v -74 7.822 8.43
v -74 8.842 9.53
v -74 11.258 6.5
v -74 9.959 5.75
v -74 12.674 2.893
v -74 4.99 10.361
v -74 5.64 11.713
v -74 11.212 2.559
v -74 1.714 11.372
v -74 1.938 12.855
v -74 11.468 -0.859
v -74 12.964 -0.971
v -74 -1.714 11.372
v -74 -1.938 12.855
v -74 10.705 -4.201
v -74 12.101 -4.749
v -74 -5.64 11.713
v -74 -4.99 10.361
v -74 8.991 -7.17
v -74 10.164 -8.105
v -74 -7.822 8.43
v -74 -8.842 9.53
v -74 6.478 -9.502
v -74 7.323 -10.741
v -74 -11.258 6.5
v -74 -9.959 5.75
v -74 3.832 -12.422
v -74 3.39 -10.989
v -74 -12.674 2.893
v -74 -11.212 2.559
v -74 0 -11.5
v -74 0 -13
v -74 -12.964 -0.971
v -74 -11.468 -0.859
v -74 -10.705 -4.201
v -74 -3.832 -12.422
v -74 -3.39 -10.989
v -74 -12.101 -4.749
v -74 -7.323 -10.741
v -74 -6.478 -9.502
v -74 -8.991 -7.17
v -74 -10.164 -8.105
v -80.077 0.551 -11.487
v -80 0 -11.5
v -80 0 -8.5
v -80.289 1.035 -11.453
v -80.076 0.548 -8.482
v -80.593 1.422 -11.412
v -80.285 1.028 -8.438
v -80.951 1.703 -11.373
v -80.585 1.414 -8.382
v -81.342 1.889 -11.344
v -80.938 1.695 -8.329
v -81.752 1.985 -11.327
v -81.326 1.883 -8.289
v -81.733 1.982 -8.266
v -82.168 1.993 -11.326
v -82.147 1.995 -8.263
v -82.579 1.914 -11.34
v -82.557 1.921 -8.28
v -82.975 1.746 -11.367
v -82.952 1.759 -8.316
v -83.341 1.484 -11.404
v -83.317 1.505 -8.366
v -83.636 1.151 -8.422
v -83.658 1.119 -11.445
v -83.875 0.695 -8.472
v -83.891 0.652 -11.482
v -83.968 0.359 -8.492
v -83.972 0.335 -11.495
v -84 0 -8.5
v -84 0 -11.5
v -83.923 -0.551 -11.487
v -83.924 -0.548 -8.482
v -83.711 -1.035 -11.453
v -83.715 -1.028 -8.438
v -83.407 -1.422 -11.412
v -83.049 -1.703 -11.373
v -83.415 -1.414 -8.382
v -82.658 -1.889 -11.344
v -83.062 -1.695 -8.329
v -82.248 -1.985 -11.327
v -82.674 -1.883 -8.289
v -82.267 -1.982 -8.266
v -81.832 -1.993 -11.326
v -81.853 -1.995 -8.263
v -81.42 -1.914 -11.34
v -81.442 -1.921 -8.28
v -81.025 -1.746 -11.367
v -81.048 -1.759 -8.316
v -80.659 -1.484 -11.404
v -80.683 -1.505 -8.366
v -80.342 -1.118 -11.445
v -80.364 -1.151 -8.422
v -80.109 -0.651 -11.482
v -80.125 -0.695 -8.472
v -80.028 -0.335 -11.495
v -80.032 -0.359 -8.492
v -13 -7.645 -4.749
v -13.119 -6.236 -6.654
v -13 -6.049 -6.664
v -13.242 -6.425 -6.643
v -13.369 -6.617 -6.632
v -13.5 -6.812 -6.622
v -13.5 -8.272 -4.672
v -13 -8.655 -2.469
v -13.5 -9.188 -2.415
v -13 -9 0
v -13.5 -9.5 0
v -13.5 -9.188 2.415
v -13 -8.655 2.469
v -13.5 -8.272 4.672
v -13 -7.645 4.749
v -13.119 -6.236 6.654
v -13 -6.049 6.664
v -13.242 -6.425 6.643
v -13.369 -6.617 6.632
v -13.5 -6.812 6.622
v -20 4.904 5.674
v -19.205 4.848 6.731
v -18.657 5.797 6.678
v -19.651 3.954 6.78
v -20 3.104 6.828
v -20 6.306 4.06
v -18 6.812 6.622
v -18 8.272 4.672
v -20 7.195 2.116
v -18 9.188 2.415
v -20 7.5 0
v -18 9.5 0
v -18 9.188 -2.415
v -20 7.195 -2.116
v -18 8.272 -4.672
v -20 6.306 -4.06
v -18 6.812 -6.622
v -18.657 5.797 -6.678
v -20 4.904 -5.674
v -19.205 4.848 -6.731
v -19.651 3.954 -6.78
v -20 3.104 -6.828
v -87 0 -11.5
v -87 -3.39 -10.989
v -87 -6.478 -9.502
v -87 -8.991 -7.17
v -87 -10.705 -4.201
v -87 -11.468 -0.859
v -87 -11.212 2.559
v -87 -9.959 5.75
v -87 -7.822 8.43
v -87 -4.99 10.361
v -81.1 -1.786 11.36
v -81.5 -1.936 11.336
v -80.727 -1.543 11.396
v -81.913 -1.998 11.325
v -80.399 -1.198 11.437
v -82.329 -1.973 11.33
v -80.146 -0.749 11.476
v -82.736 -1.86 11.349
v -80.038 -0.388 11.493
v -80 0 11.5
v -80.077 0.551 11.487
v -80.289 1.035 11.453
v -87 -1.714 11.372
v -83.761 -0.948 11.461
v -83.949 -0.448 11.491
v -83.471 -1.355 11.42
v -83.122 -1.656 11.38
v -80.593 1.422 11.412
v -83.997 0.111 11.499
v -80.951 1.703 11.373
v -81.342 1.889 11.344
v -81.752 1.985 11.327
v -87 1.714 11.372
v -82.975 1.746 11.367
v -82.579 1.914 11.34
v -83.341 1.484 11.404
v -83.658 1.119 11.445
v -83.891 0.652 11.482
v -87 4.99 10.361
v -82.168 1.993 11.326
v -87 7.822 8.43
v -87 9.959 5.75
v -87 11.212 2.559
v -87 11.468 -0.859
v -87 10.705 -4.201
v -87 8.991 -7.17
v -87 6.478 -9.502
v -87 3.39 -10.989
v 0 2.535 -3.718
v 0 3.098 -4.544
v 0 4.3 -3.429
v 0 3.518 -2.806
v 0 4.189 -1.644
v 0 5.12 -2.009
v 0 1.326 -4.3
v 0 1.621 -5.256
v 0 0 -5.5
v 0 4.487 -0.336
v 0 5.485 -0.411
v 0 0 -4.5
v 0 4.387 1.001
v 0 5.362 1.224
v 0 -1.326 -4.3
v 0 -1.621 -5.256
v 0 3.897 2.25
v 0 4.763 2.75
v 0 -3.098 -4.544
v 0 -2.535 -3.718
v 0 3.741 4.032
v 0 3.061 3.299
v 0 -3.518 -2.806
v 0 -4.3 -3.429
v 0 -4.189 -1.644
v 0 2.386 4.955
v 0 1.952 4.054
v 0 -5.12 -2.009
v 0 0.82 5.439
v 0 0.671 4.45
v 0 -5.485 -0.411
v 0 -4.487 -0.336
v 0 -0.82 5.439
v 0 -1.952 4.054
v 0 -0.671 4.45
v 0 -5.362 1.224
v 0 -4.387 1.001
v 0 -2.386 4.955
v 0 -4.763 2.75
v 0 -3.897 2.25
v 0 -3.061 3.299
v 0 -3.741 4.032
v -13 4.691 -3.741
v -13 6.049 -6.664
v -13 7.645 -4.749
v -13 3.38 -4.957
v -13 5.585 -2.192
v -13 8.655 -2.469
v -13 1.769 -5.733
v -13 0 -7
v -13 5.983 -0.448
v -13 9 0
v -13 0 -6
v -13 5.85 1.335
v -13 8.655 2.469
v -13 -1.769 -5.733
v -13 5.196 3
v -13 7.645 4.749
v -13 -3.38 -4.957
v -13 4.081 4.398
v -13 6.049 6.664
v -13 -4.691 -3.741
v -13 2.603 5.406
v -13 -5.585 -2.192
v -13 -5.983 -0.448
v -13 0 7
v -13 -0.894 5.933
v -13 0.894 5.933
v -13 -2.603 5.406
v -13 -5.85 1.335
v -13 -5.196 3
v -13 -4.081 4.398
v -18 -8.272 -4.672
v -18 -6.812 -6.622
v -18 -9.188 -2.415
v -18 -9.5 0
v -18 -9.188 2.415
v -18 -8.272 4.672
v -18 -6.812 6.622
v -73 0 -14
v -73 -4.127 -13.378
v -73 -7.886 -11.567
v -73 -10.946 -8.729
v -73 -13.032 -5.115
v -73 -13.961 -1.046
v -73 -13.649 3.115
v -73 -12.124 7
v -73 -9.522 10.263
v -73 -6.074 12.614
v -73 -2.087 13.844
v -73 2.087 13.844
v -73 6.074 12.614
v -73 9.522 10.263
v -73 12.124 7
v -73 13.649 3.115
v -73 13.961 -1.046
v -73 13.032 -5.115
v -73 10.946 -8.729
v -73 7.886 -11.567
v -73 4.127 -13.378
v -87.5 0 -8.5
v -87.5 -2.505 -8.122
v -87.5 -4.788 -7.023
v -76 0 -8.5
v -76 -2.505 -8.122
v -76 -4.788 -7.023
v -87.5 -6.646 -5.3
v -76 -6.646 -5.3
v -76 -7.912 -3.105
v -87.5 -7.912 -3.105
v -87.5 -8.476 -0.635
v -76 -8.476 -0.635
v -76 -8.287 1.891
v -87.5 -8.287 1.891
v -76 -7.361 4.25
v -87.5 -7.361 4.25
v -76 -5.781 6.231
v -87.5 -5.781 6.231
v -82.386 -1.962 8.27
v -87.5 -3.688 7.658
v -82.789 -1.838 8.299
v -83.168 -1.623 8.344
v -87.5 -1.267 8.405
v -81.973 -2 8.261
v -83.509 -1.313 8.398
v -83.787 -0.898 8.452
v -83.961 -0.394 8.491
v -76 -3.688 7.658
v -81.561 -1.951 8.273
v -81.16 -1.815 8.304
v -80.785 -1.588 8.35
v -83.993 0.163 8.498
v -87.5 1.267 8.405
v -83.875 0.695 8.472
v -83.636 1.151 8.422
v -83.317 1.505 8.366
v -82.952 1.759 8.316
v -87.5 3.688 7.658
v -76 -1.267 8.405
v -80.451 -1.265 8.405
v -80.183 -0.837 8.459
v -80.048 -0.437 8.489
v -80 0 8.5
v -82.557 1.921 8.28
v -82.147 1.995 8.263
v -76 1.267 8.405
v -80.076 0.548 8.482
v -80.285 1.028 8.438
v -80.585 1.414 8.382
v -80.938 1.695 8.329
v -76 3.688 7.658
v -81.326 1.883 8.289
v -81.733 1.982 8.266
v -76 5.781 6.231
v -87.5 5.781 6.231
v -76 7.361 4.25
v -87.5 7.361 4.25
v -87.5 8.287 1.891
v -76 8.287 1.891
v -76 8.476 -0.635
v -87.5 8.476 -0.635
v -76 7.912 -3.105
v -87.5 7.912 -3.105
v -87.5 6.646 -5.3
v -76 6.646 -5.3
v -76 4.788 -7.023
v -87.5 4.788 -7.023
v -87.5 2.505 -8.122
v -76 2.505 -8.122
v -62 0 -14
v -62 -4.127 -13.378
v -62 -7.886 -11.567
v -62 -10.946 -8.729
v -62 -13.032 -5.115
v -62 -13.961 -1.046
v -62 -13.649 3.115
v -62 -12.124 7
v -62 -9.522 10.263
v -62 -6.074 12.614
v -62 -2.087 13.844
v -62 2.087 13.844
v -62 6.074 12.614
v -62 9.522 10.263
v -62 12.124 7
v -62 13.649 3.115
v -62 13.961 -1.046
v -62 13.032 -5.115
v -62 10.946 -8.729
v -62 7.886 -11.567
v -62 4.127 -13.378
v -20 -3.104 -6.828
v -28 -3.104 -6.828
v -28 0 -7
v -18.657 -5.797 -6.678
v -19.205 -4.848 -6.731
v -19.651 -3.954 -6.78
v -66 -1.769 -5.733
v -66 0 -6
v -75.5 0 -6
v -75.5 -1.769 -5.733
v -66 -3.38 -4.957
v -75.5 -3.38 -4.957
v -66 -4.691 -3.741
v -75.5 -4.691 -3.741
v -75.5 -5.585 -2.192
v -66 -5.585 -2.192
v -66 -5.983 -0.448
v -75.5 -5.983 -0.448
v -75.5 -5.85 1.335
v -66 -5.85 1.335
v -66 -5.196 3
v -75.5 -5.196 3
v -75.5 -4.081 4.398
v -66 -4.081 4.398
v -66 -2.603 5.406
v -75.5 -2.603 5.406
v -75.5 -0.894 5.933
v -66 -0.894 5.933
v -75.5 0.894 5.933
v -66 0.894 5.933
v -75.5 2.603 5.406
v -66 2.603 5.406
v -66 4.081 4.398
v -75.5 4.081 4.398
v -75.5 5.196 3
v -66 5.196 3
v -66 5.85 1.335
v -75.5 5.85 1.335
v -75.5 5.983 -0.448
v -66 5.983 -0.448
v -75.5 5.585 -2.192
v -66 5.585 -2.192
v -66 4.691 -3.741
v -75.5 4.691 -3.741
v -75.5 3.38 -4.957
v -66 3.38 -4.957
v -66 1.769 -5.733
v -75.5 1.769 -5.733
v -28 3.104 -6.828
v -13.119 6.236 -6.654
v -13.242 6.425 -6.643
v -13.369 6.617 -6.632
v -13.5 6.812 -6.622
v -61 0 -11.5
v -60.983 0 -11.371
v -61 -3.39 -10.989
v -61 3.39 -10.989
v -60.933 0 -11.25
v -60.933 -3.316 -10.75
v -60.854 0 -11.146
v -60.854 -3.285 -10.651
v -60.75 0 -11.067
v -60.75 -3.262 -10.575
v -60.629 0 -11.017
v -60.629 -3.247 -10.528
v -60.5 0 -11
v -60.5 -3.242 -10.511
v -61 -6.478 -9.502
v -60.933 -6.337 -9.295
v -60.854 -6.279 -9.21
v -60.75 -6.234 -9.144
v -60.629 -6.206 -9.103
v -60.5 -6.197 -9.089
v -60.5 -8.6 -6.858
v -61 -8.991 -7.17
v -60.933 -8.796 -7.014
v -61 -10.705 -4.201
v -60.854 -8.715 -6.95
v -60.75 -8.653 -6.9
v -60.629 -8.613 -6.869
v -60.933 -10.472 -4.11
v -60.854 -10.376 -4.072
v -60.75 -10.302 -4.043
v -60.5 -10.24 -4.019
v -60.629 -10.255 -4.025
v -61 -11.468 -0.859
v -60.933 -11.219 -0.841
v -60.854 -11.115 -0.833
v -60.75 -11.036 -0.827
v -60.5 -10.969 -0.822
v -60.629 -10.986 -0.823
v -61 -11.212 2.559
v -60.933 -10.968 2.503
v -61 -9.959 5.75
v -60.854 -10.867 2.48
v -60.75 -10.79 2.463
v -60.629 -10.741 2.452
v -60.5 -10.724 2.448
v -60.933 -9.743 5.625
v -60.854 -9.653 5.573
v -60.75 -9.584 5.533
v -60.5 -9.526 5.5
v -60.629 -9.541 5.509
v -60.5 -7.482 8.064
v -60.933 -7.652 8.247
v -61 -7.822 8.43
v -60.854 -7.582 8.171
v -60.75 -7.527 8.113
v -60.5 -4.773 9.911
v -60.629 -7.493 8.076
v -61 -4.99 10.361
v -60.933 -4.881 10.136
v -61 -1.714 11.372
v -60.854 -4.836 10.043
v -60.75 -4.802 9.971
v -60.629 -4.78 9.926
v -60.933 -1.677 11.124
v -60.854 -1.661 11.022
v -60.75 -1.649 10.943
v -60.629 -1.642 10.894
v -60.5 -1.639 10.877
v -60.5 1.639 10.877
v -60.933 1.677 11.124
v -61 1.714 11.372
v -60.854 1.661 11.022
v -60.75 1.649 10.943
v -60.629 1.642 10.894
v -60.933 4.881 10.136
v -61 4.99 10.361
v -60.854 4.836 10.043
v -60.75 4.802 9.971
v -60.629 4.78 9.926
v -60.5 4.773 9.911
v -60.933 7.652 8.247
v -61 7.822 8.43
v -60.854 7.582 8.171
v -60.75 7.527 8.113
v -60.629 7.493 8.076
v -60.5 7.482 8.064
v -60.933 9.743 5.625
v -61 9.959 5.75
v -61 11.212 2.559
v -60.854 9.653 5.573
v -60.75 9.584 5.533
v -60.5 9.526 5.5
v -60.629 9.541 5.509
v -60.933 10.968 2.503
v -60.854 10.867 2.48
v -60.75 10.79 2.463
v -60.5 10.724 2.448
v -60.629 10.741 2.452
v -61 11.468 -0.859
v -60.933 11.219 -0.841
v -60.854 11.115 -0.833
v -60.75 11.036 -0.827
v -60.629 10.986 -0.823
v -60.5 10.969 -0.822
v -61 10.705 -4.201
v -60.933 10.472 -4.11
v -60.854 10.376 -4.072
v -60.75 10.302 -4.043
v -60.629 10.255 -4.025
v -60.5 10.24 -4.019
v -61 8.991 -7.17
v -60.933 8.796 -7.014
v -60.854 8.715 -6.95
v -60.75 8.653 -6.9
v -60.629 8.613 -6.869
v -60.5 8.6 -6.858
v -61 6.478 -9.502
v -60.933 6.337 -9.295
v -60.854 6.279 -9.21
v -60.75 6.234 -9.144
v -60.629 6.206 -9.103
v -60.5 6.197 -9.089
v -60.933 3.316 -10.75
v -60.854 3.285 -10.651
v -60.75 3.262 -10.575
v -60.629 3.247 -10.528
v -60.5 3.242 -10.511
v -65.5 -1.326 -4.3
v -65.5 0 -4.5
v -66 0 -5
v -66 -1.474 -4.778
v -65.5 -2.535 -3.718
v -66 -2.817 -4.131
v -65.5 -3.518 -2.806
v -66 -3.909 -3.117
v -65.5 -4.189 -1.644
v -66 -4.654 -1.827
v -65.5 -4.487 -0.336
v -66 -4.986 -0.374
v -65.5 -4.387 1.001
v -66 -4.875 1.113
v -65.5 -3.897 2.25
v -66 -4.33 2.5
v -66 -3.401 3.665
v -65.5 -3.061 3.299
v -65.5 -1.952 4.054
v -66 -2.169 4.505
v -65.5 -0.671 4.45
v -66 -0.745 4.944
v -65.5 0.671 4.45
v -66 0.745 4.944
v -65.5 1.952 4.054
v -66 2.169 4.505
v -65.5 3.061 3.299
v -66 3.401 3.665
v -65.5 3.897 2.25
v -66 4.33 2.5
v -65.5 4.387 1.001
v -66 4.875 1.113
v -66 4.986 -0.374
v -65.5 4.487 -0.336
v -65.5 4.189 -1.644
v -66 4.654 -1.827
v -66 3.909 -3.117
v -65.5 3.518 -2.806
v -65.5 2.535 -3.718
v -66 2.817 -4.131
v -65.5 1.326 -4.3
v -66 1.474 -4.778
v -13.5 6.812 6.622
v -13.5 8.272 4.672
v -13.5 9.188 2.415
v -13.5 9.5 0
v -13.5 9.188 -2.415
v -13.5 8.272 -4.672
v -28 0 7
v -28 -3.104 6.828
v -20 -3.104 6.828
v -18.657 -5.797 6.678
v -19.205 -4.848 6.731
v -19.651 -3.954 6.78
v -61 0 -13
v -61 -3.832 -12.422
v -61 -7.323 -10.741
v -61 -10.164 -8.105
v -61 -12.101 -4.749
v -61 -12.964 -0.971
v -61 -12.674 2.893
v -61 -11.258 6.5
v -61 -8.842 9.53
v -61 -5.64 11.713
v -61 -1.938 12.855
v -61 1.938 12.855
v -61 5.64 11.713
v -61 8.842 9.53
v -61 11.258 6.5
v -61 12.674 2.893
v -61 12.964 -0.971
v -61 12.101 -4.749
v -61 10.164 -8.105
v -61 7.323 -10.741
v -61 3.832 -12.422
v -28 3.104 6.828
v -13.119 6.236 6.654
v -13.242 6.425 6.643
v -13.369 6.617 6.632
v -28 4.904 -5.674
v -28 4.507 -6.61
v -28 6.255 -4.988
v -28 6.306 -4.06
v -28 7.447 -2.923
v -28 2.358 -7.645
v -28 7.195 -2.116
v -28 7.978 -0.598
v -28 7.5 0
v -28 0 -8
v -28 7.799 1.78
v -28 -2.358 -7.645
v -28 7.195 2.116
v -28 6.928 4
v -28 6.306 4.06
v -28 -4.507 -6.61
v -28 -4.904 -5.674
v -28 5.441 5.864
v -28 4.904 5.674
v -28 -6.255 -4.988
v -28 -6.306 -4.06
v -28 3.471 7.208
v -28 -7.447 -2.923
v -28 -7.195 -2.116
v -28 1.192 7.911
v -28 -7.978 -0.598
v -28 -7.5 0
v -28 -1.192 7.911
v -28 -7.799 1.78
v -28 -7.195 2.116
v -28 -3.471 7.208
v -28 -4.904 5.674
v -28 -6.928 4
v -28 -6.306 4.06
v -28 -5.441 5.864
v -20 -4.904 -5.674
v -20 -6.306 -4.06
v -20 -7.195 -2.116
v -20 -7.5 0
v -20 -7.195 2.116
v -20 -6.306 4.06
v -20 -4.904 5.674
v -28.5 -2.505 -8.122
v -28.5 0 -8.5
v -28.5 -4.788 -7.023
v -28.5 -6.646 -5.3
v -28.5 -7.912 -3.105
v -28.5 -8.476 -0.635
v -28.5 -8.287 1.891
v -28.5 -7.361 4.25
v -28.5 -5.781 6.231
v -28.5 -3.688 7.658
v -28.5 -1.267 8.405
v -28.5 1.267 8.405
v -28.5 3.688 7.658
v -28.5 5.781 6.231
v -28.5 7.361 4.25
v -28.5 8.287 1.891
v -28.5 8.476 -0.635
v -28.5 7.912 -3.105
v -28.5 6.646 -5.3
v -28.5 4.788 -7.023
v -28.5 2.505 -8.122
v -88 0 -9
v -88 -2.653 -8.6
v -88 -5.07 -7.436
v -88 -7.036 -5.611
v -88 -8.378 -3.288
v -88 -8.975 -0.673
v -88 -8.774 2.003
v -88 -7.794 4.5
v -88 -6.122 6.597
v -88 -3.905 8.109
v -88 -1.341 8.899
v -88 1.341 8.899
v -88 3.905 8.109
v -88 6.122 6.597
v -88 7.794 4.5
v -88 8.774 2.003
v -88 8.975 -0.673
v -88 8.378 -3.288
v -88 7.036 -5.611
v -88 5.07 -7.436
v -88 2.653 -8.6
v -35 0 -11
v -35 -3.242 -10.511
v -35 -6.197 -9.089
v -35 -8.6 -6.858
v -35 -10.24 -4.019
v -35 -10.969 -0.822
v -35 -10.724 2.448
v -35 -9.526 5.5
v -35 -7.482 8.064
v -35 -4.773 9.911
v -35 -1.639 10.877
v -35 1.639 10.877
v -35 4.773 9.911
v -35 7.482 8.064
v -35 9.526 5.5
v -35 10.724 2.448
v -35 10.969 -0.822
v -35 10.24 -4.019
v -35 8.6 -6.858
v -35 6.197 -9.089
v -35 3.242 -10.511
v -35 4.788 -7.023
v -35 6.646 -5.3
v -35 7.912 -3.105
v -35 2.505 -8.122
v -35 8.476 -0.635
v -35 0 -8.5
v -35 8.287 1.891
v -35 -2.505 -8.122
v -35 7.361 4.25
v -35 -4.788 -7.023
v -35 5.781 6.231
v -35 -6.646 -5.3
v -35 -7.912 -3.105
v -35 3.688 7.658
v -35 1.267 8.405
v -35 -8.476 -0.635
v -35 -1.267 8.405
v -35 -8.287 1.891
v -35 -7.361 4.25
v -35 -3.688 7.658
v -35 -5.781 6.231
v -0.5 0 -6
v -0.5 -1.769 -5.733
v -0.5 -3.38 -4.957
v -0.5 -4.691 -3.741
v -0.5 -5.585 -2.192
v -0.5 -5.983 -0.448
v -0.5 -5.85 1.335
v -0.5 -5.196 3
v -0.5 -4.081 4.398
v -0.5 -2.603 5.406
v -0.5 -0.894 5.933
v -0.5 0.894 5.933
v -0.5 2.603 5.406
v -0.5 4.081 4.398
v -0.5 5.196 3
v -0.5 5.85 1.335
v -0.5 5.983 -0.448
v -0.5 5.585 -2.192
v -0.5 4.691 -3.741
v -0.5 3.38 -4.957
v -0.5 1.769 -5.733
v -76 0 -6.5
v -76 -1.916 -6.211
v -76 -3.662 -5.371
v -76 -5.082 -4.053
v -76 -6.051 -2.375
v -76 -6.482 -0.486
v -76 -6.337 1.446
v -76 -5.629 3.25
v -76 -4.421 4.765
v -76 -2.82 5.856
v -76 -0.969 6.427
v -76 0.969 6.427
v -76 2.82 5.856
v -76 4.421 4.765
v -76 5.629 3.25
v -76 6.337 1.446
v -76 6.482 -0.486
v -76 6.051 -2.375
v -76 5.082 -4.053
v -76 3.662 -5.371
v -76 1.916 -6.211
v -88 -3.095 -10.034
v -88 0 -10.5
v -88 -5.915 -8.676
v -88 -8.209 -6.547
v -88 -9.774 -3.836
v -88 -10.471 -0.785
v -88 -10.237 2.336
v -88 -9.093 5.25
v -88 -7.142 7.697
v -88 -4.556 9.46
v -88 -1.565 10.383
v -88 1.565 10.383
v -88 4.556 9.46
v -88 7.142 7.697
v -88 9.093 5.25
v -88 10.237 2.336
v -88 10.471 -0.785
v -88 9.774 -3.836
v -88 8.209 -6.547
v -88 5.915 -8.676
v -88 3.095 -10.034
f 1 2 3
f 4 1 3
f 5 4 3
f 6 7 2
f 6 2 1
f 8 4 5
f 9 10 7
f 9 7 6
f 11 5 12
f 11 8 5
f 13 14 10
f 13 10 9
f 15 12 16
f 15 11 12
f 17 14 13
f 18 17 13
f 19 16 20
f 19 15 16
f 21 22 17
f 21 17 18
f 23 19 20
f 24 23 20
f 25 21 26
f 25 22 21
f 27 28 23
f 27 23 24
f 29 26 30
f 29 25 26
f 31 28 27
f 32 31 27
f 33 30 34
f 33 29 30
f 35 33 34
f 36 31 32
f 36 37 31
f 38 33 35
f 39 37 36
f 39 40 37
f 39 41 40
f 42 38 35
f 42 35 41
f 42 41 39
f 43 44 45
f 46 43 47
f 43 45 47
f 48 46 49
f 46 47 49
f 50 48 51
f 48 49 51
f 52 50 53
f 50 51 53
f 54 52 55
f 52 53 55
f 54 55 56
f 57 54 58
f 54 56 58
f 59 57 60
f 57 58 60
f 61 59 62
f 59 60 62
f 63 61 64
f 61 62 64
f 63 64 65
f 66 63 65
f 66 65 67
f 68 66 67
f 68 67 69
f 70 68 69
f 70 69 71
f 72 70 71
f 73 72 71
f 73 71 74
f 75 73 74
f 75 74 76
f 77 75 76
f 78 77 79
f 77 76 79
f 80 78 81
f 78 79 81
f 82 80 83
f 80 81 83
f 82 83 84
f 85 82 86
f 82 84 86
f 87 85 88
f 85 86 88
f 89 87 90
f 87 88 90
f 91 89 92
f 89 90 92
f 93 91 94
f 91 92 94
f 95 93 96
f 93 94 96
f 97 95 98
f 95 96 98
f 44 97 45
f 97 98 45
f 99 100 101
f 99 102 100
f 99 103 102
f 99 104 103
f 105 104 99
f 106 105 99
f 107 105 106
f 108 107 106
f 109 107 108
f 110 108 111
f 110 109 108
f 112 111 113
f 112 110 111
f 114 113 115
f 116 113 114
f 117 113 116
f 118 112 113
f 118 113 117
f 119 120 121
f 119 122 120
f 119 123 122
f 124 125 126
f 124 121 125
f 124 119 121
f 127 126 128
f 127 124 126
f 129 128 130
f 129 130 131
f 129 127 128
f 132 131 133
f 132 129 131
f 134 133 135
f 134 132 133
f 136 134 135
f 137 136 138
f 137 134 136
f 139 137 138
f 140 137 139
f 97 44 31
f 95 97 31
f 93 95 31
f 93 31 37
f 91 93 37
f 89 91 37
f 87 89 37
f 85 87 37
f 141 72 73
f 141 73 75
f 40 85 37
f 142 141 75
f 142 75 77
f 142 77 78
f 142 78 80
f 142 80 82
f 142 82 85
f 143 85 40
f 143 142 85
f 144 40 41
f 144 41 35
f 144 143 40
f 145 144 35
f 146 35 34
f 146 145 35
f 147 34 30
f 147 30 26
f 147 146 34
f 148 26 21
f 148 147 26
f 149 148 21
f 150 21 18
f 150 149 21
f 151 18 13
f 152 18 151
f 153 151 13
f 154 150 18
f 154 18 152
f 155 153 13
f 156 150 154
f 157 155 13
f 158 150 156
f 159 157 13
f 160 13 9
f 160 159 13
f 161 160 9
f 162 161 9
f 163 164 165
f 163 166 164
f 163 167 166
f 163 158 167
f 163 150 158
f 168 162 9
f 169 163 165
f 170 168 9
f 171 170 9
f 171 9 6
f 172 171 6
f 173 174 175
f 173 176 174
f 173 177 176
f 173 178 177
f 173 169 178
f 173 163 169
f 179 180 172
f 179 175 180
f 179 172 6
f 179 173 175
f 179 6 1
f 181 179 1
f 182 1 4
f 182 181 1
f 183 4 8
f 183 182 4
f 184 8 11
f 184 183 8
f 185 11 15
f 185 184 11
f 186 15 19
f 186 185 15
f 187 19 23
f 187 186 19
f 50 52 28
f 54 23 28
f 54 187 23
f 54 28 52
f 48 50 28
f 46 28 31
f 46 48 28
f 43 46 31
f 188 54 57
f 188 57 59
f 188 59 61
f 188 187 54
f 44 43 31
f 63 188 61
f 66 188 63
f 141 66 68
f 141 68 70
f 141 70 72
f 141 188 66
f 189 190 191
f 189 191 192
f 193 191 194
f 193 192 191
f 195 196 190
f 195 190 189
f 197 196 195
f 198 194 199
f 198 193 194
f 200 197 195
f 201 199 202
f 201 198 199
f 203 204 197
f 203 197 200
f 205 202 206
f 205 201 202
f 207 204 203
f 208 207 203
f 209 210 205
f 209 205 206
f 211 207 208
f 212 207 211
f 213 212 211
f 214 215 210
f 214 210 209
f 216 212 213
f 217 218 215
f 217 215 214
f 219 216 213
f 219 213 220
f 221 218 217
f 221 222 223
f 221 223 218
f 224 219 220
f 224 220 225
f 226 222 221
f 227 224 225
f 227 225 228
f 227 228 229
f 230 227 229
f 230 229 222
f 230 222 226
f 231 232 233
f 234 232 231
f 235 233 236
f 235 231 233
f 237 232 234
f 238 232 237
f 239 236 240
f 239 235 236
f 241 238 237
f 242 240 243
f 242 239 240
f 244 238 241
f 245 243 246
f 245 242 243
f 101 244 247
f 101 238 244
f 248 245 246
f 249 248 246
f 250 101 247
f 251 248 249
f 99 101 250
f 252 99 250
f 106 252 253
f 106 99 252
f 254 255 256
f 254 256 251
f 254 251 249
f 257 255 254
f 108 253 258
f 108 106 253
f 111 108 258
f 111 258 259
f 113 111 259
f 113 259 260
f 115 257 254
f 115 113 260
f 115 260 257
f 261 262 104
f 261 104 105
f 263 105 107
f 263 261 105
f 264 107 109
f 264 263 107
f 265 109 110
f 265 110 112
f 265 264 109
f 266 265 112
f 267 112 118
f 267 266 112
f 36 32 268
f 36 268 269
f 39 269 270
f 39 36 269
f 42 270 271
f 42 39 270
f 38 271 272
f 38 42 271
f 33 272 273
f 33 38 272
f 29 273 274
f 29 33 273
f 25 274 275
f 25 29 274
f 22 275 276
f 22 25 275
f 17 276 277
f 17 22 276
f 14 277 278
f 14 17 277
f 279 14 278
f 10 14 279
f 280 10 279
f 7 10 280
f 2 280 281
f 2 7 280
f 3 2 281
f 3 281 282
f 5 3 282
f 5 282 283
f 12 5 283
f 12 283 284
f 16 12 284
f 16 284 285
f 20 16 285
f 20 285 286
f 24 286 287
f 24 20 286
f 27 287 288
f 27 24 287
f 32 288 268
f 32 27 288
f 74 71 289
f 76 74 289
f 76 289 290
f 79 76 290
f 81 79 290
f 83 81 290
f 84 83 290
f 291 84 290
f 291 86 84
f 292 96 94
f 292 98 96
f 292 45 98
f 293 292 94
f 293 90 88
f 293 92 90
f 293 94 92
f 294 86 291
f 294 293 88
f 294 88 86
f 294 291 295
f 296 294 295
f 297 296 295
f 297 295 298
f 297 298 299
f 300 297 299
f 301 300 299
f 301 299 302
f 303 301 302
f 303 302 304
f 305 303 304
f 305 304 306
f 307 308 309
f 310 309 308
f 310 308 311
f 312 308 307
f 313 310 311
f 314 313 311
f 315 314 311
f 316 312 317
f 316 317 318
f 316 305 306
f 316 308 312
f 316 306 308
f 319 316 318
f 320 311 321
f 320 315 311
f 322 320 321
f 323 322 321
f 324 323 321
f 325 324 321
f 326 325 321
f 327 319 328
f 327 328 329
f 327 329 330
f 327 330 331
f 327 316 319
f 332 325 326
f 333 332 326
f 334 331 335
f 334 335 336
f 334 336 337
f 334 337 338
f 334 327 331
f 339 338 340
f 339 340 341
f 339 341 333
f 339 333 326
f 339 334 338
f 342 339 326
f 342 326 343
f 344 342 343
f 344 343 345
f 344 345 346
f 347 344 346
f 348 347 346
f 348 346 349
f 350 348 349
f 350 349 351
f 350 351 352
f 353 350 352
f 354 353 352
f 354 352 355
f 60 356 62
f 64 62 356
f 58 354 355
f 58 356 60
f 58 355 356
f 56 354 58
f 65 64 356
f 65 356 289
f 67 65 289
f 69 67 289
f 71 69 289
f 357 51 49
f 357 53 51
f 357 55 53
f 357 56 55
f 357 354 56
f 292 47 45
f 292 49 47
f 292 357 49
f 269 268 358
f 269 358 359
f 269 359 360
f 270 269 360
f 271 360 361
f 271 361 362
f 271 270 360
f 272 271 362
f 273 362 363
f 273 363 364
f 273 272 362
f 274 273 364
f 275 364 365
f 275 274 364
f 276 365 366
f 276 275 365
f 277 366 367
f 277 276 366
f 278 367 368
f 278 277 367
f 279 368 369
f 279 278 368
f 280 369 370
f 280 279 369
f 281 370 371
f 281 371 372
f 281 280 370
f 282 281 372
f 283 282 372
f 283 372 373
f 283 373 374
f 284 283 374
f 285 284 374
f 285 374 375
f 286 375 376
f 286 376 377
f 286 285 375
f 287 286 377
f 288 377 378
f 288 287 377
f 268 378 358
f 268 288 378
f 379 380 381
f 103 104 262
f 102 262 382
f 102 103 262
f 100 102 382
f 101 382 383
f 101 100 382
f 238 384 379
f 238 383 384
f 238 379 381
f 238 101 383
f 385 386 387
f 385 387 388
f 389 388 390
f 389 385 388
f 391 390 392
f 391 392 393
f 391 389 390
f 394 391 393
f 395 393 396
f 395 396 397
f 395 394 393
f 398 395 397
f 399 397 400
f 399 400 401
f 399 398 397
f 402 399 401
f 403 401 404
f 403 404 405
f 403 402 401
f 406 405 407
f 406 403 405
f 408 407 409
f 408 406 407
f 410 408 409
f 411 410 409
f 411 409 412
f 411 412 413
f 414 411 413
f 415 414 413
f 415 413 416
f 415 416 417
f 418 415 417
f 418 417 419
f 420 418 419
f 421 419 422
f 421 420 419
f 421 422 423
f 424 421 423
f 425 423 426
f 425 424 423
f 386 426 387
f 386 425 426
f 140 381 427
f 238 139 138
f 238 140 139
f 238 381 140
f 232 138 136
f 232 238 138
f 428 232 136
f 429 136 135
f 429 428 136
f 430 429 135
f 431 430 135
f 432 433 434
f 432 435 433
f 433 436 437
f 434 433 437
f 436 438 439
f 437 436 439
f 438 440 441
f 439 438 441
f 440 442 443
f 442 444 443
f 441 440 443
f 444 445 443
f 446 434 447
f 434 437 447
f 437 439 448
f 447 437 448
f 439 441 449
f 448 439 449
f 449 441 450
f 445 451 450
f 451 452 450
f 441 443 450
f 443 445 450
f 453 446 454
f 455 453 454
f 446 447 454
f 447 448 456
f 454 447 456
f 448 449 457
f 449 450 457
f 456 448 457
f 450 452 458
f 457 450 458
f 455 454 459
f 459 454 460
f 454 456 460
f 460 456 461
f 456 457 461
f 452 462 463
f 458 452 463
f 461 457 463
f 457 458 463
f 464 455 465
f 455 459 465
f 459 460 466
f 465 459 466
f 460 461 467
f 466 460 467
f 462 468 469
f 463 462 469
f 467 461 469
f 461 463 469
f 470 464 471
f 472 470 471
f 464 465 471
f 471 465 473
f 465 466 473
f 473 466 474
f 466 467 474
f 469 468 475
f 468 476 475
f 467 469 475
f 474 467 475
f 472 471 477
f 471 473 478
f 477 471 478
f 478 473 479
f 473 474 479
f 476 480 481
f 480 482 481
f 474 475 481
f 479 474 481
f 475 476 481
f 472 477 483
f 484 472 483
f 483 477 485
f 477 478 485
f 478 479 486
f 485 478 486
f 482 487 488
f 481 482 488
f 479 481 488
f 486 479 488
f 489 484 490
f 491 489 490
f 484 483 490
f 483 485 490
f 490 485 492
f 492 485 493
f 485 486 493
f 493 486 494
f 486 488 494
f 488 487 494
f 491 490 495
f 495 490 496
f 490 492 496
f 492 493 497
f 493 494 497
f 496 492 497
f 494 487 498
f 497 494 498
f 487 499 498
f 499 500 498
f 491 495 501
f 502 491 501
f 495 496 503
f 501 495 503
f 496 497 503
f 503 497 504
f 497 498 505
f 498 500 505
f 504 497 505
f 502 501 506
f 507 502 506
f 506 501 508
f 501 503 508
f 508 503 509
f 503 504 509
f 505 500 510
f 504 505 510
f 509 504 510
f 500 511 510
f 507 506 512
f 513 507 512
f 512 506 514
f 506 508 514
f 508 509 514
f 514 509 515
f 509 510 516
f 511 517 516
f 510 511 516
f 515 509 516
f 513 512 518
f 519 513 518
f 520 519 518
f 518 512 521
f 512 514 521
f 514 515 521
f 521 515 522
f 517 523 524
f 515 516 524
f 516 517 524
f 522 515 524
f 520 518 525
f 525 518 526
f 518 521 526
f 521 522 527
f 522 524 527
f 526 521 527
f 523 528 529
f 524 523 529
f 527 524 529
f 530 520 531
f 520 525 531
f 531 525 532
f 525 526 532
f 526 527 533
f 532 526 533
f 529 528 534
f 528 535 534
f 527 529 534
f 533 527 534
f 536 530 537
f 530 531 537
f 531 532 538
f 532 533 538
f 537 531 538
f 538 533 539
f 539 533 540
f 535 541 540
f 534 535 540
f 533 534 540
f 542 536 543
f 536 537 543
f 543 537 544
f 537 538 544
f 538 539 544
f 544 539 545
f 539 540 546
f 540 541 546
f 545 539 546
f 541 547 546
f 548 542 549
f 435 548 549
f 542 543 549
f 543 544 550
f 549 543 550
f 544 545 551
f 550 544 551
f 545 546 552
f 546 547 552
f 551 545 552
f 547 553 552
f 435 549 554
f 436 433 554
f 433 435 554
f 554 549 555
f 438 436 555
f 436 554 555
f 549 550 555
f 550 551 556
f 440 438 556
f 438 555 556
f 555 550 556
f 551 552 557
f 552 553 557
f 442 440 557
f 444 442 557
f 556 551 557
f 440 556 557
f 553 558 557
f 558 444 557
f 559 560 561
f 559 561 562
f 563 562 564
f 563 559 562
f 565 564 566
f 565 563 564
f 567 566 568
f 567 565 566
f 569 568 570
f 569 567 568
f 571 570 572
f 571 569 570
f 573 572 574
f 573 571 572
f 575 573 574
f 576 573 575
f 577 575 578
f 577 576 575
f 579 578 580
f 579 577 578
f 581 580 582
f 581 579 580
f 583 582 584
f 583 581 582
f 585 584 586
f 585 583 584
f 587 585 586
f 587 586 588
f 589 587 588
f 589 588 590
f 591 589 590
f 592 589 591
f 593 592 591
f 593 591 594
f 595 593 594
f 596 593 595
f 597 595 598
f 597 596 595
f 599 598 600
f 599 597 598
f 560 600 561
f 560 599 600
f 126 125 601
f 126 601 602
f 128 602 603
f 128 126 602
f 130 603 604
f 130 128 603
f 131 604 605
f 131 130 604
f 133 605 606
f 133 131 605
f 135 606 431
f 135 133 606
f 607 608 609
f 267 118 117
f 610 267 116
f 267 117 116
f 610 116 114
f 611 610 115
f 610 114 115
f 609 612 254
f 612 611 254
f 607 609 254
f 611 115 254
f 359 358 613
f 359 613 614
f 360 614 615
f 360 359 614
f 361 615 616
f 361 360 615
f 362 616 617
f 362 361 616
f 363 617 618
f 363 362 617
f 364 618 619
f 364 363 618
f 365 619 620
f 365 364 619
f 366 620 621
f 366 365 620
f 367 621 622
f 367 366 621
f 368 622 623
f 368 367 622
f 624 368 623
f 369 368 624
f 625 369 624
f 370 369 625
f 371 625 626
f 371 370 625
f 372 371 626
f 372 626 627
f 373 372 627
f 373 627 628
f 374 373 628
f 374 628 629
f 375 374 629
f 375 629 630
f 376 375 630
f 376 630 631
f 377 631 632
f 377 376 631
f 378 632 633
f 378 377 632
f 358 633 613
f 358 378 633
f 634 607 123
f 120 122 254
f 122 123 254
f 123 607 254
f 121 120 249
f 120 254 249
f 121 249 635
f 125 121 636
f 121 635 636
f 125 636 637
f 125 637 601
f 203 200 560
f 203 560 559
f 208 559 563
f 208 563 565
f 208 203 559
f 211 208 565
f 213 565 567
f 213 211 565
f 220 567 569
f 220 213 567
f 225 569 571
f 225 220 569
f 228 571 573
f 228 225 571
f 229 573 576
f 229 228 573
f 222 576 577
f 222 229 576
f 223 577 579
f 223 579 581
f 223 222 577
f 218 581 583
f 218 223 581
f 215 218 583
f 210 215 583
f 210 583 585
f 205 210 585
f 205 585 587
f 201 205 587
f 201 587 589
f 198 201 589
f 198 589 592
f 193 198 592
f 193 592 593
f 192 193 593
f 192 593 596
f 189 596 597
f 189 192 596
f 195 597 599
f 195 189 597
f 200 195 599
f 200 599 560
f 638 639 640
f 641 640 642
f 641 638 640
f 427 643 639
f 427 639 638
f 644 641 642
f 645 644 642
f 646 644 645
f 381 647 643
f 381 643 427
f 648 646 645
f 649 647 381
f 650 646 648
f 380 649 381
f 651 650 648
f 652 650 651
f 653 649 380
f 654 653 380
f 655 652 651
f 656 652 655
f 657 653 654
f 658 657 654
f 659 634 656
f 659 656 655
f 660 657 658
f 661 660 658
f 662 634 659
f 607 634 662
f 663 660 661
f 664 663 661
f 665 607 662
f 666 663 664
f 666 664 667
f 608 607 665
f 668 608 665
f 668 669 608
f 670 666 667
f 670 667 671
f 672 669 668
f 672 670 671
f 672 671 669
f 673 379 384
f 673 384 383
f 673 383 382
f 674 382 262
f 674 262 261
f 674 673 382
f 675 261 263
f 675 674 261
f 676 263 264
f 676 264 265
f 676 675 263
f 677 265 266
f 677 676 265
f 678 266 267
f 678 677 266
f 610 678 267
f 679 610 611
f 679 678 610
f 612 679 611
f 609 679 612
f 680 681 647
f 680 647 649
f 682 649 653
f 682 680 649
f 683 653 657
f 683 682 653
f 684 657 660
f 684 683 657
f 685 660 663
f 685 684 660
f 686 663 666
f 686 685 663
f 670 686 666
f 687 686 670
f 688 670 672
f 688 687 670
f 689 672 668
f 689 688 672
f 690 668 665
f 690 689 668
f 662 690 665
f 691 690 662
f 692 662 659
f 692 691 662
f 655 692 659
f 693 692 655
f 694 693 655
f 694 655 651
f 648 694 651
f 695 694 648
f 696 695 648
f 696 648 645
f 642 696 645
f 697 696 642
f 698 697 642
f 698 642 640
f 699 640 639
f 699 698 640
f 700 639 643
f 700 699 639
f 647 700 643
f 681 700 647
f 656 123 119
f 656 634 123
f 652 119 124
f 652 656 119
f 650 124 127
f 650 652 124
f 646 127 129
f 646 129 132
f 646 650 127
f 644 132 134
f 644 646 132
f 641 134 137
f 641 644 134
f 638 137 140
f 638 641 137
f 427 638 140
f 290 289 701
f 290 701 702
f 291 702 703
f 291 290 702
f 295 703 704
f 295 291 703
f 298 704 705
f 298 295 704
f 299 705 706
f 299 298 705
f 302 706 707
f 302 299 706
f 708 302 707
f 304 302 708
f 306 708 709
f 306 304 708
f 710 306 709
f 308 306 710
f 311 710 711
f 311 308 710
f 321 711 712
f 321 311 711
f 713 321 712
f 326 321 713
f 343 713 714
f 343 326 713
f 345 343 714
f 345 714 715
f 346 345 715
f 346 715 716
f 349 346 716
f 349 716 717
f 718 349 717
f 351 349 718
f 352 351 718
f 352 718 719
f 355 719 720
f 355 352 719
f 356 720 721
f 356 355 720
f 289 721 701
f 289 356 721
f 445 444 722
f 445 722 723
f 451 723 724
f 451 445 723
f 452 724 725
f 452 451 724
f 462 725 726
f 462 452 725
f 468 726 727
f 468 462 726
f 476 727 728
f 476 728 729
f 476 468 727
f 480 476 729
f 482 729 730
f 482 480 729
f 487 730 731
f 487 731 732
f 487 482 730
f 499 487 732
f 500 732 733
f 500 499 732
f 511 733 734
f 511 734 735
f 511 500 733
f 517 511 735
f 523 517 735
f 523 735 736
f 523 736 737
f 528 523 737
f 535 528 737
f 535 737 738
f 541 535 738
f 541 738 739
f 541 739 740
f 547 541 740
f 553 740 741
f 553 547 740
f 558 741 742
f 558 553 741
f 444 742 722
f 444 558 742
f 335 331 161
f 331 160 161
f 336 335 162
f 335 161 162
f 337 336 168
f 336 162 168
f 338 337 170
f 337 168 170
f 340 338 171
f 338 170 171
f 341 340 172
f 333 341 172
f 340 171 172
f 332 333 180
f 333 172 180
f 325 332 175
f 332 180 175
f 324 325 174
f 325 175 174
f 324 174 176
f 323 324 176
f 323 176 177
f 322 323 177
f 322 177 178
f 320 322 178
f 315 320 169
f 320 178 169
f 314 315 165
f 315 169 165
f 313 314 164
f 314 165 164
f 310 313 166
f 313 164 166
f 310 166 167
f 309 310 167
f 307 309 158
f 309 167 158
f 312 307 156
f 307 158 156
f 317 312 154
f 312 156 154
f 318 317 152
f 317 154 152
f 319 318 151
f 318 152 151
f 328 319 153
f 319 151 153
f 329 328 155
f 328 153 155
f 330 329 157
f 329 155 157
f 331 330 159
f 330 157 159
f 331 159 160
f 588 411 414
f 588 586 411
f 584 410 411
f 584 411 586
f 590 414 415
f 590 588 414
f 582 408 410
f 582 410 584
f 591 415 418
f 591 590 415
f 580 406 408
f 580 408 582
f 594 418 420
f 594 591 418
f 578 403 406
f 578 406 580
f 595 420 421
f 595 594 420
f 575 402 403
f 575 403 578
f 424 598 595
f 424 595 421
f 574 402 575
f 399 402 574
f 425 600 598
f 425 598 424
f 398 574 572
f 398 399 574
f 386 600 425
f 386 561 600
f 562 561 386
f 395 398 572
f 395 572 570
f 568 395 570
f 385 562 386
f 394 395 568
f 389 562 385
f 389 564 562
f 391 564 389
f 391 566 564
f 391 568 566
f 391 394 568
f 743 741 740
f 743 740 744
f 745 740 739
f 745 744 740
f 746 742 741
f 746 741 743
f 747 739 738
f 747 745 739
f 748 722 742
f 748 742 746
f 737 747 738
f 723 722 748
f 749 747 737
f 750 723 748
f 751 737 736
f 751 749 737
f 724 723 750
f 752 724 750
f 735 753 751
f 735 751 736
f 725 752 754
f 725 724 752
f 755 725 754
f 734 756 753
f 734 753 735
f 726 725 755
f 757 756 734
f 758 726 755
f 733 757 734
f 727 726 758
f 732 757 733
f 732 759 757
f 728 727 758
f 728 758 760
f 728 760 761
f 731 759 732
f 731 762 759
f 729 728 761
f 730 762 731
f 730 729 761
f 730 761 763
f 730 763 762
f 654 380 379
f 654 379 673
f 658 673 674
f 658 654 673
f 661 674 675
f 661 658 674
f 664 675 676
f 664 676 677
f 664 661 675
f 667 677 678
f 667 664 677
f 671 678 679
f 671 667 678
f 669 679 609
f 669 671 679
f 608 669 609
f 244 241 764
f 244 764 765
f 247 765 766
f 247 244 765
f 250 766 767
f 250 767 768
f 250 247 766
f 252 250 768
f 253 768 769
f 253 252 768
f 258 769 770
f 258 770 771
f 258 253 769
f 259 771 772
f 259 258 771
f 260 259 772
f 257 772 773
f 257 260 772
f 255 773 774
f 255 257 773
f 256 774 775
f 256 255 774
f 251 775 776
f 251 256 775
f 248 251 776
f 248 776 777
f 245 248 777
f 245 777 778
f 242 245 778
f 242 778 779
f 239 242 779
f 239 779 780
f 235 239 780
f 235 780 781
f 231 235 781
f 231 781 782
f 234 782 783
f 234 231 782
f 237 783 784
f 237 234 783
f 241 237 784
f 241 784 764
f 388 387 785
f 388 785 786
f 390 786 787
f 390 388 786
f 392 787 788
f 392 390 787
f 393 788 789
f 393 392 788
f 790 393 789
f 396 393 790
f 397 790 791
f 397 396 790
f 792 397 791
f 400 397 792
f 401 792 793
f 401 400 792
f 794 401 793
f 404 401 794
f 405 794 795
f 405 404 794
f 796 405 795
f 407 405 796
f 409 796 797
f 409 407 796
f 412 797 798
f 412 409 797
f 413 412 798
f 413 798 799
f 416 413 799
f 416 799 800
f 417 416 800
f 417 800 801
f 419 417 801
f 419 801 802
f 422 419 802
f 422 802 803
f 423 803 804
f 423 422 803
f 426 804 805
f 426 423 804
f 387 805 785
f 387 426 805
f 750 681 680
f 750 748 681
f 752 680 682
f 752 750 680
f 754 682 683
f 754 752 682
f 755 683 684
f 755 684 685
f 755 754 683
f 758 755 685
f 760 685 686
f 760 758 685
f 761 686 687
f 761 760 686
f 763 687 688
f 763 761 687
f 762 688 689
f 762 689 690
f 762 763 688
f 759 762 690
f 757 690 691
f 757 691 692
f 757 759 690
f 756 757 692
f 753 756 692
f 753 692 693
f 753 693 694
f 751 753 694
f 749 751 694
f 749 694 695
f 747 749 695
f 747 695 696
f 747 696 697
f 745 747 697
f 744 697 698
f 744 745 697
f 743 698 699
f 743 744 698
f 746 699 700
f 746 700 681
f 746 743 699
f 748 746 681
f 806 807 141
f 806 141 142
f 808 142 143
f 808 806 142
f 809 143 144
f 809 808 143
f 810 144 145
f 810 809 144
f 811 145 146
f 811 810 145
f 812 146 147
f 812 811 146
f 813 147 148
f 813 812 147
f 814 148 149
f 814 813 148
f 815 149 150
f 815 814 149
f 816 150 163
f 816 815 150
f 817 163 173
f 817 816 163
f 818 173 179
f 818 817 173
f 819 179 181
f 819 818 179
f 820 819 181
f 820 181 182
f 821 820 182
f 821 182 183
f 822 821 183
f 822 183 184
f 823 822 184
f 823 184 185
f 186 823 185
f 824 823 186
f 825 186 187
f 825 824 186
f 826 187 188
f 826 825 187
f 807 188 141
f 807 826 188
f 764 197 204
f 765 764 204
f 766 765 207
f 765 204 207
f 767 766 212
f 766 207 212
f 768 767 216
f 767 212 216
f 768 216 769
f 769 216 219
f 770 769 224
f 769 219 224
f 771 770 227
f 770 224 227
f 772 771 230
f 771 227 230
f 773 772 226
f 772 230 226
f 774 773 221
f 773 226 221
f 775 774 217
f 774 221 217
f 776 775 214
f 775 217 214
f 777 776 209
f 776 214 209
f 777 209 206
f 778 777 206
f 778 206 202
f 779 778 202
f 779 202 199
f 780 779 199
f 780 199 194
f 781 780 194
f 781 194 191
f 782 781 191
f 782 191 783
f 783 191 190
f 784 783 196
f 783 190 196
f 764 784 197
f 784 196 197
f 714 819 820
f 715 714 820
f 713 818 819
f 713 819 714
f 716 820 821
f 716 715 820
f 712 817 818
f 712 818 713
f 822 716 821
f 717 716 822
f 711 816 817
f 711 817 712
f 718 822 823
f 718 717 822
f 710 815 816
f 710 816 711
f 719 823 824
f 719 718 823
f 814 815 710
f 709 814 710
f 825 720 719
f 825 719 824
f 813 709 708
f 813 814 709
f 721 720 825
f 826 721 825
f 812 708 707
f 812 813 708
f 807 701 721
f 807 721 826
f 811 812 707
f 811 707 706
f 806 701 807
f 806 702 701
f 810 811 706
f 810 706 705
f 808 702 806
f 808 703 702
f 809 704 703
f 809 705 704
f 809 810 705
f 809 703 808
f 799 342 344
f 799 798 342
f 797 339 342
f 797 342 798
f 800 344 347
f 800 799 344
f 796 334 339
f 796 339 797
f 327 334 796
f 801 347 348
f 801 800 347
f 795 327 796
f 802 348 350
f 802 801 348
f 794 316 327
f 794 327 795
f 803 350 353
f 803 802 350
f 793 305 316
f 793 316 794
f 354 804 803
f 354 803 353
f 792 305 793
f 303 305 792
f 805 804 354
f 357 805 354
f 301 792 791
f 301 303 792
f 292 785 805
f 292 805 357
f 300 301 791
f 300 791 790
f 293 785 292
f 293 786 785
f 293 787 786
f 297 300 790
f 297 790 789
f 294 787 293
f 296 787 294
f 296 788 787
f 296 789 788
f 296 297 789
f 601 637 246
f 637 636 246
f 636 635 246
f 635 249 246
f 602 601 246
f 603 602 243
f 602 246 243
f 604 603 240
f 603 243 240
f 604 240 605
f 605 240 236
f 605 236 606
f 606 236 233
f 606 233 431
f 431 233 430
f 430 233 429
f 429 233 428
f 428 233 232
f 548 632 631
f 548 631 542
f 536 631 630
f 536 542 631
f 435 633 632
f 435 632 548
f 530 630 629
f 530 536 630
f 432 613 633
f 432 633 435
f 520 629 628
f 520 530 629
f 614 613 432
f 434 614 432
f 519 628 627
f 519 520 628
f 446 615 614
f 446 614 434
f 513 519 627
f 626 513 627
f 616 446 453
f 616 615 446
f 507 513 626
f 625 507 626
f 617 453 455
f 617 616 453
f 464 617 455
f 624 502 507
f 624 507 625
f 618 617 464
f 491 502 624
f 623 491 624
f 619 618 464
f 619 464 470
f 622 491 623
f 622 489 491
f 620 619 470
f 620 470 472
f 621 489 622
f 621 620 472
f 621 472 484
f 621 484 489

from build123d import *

# Parameters (mm, degrees)
CHANFREIN1_SIZE         = 1
CONG_1_R                = 0.5
CHANFREIN2_SIZE         = 0.5
ENL_V_MAT_EXTRU_1_DEPTH = 15
CHANFREIN3_SIZE         = 0.5
ESQUISSE3_R             = 2
ENL_V_MAT_EXTRU_2_DEPTH = 96.372952141


with BuildPart() as part:
    # Esquisse1 → Base-Révolution (revolve)
    with BuildSketch(Plane.XY, mode=Mode.PRIVATE) as base_r_volution_sk:
        Polygon((0, 4.5), (0, 6), (-13, 6), (-13, 9.5), (-18, 9.5), (-20, 7.5), (-28, 7.5), (-28, 8), (-28.5, 8.5), (-35, 8.5), (-35, 11), (-61, 11), (-61, 14), (-74, 14), (-74, 11.5), (-88, 11.5), (-88, 8.5), (-76, 8.5), (-76, 6), (-66, 6), (-66, 4.5), align=None)
    revolve(base_r_volution_sk.sketch.rotate(Axis((11, 0, 0), (-1, 0, 0)), 90), axis=Axis((11, 0, 0), (-1, 0, 0)))

    # Chanfrein1
    chanfrein1_edges = [part.edges().sort_by_distance(p)[0] for p in [
        (-61, 0, 14),
        (-74, 0, 14),
        (-88, 0, 11.5),
    ]]
    chamfer(chanfrein1_edges, length=CHANFREIN1_SIZE)

    # Congé1
    cong_1_edges = [part.edges().sort_by_distance(p)[0] for p in [
        (-61, 0, 11),
    ]]
    fillet(cong_1_edges, radius=CONG_1_R)

    # Chanfrein2
    chanfrein2_edges = [part.edges().sort_by_distance(p)[0] for p in [
        (-88, 0, 8.5),
        (-76, 0, 6),
        (0, 0, 6),
        (-66, 0, 4.5),
    ]]
    chamfer(chanfrein2_edges, length=CHANFREIN2_SIZE)

    # Esquisse2 → Enlèv. mat.-Extru.1 (cut)
    with BuildSketch(Plane(origin=(-13, 0, 0), x_dir=(0, 0, -1), z_dir=(1, 0, 0))):
        Polygon((-7, 0), (-6.5, 9), (-14, 9), (-14, -9), (-6.5, -9), align=None)
        Polygon((14, -9), (6.5, -9), (7, 0), (6.5, 9), (14, 9), align=None)
    extrude(amount=-ENL_V_MAT_EXTRU_1_DEPTH, mode=Mode.SUBTRACT)

    # Chanfrein3
    chanfrein3_edges = [part.edges().sort_by_distance(p)[0] for p in [
        (-13, 9.5, 0),
        (-13, -9.5, 0),
    ]]
    chamfer(chanfrein3_edges, length=CHANFREIN3_SIZE)

    # Esquisse3 → Enlèv. mat.-Extru.2 (cut, through all)
    with BuildSketch(Plane.XY.offset(20)):
        with Locations((-82, 0)):
            Circle(ESQUISSE3_R)
    extrude(amount=-ENL_V_MAT_EXTRU_2_DEPTH, mode=Mode.SUBTRACT)


solid = part.part
